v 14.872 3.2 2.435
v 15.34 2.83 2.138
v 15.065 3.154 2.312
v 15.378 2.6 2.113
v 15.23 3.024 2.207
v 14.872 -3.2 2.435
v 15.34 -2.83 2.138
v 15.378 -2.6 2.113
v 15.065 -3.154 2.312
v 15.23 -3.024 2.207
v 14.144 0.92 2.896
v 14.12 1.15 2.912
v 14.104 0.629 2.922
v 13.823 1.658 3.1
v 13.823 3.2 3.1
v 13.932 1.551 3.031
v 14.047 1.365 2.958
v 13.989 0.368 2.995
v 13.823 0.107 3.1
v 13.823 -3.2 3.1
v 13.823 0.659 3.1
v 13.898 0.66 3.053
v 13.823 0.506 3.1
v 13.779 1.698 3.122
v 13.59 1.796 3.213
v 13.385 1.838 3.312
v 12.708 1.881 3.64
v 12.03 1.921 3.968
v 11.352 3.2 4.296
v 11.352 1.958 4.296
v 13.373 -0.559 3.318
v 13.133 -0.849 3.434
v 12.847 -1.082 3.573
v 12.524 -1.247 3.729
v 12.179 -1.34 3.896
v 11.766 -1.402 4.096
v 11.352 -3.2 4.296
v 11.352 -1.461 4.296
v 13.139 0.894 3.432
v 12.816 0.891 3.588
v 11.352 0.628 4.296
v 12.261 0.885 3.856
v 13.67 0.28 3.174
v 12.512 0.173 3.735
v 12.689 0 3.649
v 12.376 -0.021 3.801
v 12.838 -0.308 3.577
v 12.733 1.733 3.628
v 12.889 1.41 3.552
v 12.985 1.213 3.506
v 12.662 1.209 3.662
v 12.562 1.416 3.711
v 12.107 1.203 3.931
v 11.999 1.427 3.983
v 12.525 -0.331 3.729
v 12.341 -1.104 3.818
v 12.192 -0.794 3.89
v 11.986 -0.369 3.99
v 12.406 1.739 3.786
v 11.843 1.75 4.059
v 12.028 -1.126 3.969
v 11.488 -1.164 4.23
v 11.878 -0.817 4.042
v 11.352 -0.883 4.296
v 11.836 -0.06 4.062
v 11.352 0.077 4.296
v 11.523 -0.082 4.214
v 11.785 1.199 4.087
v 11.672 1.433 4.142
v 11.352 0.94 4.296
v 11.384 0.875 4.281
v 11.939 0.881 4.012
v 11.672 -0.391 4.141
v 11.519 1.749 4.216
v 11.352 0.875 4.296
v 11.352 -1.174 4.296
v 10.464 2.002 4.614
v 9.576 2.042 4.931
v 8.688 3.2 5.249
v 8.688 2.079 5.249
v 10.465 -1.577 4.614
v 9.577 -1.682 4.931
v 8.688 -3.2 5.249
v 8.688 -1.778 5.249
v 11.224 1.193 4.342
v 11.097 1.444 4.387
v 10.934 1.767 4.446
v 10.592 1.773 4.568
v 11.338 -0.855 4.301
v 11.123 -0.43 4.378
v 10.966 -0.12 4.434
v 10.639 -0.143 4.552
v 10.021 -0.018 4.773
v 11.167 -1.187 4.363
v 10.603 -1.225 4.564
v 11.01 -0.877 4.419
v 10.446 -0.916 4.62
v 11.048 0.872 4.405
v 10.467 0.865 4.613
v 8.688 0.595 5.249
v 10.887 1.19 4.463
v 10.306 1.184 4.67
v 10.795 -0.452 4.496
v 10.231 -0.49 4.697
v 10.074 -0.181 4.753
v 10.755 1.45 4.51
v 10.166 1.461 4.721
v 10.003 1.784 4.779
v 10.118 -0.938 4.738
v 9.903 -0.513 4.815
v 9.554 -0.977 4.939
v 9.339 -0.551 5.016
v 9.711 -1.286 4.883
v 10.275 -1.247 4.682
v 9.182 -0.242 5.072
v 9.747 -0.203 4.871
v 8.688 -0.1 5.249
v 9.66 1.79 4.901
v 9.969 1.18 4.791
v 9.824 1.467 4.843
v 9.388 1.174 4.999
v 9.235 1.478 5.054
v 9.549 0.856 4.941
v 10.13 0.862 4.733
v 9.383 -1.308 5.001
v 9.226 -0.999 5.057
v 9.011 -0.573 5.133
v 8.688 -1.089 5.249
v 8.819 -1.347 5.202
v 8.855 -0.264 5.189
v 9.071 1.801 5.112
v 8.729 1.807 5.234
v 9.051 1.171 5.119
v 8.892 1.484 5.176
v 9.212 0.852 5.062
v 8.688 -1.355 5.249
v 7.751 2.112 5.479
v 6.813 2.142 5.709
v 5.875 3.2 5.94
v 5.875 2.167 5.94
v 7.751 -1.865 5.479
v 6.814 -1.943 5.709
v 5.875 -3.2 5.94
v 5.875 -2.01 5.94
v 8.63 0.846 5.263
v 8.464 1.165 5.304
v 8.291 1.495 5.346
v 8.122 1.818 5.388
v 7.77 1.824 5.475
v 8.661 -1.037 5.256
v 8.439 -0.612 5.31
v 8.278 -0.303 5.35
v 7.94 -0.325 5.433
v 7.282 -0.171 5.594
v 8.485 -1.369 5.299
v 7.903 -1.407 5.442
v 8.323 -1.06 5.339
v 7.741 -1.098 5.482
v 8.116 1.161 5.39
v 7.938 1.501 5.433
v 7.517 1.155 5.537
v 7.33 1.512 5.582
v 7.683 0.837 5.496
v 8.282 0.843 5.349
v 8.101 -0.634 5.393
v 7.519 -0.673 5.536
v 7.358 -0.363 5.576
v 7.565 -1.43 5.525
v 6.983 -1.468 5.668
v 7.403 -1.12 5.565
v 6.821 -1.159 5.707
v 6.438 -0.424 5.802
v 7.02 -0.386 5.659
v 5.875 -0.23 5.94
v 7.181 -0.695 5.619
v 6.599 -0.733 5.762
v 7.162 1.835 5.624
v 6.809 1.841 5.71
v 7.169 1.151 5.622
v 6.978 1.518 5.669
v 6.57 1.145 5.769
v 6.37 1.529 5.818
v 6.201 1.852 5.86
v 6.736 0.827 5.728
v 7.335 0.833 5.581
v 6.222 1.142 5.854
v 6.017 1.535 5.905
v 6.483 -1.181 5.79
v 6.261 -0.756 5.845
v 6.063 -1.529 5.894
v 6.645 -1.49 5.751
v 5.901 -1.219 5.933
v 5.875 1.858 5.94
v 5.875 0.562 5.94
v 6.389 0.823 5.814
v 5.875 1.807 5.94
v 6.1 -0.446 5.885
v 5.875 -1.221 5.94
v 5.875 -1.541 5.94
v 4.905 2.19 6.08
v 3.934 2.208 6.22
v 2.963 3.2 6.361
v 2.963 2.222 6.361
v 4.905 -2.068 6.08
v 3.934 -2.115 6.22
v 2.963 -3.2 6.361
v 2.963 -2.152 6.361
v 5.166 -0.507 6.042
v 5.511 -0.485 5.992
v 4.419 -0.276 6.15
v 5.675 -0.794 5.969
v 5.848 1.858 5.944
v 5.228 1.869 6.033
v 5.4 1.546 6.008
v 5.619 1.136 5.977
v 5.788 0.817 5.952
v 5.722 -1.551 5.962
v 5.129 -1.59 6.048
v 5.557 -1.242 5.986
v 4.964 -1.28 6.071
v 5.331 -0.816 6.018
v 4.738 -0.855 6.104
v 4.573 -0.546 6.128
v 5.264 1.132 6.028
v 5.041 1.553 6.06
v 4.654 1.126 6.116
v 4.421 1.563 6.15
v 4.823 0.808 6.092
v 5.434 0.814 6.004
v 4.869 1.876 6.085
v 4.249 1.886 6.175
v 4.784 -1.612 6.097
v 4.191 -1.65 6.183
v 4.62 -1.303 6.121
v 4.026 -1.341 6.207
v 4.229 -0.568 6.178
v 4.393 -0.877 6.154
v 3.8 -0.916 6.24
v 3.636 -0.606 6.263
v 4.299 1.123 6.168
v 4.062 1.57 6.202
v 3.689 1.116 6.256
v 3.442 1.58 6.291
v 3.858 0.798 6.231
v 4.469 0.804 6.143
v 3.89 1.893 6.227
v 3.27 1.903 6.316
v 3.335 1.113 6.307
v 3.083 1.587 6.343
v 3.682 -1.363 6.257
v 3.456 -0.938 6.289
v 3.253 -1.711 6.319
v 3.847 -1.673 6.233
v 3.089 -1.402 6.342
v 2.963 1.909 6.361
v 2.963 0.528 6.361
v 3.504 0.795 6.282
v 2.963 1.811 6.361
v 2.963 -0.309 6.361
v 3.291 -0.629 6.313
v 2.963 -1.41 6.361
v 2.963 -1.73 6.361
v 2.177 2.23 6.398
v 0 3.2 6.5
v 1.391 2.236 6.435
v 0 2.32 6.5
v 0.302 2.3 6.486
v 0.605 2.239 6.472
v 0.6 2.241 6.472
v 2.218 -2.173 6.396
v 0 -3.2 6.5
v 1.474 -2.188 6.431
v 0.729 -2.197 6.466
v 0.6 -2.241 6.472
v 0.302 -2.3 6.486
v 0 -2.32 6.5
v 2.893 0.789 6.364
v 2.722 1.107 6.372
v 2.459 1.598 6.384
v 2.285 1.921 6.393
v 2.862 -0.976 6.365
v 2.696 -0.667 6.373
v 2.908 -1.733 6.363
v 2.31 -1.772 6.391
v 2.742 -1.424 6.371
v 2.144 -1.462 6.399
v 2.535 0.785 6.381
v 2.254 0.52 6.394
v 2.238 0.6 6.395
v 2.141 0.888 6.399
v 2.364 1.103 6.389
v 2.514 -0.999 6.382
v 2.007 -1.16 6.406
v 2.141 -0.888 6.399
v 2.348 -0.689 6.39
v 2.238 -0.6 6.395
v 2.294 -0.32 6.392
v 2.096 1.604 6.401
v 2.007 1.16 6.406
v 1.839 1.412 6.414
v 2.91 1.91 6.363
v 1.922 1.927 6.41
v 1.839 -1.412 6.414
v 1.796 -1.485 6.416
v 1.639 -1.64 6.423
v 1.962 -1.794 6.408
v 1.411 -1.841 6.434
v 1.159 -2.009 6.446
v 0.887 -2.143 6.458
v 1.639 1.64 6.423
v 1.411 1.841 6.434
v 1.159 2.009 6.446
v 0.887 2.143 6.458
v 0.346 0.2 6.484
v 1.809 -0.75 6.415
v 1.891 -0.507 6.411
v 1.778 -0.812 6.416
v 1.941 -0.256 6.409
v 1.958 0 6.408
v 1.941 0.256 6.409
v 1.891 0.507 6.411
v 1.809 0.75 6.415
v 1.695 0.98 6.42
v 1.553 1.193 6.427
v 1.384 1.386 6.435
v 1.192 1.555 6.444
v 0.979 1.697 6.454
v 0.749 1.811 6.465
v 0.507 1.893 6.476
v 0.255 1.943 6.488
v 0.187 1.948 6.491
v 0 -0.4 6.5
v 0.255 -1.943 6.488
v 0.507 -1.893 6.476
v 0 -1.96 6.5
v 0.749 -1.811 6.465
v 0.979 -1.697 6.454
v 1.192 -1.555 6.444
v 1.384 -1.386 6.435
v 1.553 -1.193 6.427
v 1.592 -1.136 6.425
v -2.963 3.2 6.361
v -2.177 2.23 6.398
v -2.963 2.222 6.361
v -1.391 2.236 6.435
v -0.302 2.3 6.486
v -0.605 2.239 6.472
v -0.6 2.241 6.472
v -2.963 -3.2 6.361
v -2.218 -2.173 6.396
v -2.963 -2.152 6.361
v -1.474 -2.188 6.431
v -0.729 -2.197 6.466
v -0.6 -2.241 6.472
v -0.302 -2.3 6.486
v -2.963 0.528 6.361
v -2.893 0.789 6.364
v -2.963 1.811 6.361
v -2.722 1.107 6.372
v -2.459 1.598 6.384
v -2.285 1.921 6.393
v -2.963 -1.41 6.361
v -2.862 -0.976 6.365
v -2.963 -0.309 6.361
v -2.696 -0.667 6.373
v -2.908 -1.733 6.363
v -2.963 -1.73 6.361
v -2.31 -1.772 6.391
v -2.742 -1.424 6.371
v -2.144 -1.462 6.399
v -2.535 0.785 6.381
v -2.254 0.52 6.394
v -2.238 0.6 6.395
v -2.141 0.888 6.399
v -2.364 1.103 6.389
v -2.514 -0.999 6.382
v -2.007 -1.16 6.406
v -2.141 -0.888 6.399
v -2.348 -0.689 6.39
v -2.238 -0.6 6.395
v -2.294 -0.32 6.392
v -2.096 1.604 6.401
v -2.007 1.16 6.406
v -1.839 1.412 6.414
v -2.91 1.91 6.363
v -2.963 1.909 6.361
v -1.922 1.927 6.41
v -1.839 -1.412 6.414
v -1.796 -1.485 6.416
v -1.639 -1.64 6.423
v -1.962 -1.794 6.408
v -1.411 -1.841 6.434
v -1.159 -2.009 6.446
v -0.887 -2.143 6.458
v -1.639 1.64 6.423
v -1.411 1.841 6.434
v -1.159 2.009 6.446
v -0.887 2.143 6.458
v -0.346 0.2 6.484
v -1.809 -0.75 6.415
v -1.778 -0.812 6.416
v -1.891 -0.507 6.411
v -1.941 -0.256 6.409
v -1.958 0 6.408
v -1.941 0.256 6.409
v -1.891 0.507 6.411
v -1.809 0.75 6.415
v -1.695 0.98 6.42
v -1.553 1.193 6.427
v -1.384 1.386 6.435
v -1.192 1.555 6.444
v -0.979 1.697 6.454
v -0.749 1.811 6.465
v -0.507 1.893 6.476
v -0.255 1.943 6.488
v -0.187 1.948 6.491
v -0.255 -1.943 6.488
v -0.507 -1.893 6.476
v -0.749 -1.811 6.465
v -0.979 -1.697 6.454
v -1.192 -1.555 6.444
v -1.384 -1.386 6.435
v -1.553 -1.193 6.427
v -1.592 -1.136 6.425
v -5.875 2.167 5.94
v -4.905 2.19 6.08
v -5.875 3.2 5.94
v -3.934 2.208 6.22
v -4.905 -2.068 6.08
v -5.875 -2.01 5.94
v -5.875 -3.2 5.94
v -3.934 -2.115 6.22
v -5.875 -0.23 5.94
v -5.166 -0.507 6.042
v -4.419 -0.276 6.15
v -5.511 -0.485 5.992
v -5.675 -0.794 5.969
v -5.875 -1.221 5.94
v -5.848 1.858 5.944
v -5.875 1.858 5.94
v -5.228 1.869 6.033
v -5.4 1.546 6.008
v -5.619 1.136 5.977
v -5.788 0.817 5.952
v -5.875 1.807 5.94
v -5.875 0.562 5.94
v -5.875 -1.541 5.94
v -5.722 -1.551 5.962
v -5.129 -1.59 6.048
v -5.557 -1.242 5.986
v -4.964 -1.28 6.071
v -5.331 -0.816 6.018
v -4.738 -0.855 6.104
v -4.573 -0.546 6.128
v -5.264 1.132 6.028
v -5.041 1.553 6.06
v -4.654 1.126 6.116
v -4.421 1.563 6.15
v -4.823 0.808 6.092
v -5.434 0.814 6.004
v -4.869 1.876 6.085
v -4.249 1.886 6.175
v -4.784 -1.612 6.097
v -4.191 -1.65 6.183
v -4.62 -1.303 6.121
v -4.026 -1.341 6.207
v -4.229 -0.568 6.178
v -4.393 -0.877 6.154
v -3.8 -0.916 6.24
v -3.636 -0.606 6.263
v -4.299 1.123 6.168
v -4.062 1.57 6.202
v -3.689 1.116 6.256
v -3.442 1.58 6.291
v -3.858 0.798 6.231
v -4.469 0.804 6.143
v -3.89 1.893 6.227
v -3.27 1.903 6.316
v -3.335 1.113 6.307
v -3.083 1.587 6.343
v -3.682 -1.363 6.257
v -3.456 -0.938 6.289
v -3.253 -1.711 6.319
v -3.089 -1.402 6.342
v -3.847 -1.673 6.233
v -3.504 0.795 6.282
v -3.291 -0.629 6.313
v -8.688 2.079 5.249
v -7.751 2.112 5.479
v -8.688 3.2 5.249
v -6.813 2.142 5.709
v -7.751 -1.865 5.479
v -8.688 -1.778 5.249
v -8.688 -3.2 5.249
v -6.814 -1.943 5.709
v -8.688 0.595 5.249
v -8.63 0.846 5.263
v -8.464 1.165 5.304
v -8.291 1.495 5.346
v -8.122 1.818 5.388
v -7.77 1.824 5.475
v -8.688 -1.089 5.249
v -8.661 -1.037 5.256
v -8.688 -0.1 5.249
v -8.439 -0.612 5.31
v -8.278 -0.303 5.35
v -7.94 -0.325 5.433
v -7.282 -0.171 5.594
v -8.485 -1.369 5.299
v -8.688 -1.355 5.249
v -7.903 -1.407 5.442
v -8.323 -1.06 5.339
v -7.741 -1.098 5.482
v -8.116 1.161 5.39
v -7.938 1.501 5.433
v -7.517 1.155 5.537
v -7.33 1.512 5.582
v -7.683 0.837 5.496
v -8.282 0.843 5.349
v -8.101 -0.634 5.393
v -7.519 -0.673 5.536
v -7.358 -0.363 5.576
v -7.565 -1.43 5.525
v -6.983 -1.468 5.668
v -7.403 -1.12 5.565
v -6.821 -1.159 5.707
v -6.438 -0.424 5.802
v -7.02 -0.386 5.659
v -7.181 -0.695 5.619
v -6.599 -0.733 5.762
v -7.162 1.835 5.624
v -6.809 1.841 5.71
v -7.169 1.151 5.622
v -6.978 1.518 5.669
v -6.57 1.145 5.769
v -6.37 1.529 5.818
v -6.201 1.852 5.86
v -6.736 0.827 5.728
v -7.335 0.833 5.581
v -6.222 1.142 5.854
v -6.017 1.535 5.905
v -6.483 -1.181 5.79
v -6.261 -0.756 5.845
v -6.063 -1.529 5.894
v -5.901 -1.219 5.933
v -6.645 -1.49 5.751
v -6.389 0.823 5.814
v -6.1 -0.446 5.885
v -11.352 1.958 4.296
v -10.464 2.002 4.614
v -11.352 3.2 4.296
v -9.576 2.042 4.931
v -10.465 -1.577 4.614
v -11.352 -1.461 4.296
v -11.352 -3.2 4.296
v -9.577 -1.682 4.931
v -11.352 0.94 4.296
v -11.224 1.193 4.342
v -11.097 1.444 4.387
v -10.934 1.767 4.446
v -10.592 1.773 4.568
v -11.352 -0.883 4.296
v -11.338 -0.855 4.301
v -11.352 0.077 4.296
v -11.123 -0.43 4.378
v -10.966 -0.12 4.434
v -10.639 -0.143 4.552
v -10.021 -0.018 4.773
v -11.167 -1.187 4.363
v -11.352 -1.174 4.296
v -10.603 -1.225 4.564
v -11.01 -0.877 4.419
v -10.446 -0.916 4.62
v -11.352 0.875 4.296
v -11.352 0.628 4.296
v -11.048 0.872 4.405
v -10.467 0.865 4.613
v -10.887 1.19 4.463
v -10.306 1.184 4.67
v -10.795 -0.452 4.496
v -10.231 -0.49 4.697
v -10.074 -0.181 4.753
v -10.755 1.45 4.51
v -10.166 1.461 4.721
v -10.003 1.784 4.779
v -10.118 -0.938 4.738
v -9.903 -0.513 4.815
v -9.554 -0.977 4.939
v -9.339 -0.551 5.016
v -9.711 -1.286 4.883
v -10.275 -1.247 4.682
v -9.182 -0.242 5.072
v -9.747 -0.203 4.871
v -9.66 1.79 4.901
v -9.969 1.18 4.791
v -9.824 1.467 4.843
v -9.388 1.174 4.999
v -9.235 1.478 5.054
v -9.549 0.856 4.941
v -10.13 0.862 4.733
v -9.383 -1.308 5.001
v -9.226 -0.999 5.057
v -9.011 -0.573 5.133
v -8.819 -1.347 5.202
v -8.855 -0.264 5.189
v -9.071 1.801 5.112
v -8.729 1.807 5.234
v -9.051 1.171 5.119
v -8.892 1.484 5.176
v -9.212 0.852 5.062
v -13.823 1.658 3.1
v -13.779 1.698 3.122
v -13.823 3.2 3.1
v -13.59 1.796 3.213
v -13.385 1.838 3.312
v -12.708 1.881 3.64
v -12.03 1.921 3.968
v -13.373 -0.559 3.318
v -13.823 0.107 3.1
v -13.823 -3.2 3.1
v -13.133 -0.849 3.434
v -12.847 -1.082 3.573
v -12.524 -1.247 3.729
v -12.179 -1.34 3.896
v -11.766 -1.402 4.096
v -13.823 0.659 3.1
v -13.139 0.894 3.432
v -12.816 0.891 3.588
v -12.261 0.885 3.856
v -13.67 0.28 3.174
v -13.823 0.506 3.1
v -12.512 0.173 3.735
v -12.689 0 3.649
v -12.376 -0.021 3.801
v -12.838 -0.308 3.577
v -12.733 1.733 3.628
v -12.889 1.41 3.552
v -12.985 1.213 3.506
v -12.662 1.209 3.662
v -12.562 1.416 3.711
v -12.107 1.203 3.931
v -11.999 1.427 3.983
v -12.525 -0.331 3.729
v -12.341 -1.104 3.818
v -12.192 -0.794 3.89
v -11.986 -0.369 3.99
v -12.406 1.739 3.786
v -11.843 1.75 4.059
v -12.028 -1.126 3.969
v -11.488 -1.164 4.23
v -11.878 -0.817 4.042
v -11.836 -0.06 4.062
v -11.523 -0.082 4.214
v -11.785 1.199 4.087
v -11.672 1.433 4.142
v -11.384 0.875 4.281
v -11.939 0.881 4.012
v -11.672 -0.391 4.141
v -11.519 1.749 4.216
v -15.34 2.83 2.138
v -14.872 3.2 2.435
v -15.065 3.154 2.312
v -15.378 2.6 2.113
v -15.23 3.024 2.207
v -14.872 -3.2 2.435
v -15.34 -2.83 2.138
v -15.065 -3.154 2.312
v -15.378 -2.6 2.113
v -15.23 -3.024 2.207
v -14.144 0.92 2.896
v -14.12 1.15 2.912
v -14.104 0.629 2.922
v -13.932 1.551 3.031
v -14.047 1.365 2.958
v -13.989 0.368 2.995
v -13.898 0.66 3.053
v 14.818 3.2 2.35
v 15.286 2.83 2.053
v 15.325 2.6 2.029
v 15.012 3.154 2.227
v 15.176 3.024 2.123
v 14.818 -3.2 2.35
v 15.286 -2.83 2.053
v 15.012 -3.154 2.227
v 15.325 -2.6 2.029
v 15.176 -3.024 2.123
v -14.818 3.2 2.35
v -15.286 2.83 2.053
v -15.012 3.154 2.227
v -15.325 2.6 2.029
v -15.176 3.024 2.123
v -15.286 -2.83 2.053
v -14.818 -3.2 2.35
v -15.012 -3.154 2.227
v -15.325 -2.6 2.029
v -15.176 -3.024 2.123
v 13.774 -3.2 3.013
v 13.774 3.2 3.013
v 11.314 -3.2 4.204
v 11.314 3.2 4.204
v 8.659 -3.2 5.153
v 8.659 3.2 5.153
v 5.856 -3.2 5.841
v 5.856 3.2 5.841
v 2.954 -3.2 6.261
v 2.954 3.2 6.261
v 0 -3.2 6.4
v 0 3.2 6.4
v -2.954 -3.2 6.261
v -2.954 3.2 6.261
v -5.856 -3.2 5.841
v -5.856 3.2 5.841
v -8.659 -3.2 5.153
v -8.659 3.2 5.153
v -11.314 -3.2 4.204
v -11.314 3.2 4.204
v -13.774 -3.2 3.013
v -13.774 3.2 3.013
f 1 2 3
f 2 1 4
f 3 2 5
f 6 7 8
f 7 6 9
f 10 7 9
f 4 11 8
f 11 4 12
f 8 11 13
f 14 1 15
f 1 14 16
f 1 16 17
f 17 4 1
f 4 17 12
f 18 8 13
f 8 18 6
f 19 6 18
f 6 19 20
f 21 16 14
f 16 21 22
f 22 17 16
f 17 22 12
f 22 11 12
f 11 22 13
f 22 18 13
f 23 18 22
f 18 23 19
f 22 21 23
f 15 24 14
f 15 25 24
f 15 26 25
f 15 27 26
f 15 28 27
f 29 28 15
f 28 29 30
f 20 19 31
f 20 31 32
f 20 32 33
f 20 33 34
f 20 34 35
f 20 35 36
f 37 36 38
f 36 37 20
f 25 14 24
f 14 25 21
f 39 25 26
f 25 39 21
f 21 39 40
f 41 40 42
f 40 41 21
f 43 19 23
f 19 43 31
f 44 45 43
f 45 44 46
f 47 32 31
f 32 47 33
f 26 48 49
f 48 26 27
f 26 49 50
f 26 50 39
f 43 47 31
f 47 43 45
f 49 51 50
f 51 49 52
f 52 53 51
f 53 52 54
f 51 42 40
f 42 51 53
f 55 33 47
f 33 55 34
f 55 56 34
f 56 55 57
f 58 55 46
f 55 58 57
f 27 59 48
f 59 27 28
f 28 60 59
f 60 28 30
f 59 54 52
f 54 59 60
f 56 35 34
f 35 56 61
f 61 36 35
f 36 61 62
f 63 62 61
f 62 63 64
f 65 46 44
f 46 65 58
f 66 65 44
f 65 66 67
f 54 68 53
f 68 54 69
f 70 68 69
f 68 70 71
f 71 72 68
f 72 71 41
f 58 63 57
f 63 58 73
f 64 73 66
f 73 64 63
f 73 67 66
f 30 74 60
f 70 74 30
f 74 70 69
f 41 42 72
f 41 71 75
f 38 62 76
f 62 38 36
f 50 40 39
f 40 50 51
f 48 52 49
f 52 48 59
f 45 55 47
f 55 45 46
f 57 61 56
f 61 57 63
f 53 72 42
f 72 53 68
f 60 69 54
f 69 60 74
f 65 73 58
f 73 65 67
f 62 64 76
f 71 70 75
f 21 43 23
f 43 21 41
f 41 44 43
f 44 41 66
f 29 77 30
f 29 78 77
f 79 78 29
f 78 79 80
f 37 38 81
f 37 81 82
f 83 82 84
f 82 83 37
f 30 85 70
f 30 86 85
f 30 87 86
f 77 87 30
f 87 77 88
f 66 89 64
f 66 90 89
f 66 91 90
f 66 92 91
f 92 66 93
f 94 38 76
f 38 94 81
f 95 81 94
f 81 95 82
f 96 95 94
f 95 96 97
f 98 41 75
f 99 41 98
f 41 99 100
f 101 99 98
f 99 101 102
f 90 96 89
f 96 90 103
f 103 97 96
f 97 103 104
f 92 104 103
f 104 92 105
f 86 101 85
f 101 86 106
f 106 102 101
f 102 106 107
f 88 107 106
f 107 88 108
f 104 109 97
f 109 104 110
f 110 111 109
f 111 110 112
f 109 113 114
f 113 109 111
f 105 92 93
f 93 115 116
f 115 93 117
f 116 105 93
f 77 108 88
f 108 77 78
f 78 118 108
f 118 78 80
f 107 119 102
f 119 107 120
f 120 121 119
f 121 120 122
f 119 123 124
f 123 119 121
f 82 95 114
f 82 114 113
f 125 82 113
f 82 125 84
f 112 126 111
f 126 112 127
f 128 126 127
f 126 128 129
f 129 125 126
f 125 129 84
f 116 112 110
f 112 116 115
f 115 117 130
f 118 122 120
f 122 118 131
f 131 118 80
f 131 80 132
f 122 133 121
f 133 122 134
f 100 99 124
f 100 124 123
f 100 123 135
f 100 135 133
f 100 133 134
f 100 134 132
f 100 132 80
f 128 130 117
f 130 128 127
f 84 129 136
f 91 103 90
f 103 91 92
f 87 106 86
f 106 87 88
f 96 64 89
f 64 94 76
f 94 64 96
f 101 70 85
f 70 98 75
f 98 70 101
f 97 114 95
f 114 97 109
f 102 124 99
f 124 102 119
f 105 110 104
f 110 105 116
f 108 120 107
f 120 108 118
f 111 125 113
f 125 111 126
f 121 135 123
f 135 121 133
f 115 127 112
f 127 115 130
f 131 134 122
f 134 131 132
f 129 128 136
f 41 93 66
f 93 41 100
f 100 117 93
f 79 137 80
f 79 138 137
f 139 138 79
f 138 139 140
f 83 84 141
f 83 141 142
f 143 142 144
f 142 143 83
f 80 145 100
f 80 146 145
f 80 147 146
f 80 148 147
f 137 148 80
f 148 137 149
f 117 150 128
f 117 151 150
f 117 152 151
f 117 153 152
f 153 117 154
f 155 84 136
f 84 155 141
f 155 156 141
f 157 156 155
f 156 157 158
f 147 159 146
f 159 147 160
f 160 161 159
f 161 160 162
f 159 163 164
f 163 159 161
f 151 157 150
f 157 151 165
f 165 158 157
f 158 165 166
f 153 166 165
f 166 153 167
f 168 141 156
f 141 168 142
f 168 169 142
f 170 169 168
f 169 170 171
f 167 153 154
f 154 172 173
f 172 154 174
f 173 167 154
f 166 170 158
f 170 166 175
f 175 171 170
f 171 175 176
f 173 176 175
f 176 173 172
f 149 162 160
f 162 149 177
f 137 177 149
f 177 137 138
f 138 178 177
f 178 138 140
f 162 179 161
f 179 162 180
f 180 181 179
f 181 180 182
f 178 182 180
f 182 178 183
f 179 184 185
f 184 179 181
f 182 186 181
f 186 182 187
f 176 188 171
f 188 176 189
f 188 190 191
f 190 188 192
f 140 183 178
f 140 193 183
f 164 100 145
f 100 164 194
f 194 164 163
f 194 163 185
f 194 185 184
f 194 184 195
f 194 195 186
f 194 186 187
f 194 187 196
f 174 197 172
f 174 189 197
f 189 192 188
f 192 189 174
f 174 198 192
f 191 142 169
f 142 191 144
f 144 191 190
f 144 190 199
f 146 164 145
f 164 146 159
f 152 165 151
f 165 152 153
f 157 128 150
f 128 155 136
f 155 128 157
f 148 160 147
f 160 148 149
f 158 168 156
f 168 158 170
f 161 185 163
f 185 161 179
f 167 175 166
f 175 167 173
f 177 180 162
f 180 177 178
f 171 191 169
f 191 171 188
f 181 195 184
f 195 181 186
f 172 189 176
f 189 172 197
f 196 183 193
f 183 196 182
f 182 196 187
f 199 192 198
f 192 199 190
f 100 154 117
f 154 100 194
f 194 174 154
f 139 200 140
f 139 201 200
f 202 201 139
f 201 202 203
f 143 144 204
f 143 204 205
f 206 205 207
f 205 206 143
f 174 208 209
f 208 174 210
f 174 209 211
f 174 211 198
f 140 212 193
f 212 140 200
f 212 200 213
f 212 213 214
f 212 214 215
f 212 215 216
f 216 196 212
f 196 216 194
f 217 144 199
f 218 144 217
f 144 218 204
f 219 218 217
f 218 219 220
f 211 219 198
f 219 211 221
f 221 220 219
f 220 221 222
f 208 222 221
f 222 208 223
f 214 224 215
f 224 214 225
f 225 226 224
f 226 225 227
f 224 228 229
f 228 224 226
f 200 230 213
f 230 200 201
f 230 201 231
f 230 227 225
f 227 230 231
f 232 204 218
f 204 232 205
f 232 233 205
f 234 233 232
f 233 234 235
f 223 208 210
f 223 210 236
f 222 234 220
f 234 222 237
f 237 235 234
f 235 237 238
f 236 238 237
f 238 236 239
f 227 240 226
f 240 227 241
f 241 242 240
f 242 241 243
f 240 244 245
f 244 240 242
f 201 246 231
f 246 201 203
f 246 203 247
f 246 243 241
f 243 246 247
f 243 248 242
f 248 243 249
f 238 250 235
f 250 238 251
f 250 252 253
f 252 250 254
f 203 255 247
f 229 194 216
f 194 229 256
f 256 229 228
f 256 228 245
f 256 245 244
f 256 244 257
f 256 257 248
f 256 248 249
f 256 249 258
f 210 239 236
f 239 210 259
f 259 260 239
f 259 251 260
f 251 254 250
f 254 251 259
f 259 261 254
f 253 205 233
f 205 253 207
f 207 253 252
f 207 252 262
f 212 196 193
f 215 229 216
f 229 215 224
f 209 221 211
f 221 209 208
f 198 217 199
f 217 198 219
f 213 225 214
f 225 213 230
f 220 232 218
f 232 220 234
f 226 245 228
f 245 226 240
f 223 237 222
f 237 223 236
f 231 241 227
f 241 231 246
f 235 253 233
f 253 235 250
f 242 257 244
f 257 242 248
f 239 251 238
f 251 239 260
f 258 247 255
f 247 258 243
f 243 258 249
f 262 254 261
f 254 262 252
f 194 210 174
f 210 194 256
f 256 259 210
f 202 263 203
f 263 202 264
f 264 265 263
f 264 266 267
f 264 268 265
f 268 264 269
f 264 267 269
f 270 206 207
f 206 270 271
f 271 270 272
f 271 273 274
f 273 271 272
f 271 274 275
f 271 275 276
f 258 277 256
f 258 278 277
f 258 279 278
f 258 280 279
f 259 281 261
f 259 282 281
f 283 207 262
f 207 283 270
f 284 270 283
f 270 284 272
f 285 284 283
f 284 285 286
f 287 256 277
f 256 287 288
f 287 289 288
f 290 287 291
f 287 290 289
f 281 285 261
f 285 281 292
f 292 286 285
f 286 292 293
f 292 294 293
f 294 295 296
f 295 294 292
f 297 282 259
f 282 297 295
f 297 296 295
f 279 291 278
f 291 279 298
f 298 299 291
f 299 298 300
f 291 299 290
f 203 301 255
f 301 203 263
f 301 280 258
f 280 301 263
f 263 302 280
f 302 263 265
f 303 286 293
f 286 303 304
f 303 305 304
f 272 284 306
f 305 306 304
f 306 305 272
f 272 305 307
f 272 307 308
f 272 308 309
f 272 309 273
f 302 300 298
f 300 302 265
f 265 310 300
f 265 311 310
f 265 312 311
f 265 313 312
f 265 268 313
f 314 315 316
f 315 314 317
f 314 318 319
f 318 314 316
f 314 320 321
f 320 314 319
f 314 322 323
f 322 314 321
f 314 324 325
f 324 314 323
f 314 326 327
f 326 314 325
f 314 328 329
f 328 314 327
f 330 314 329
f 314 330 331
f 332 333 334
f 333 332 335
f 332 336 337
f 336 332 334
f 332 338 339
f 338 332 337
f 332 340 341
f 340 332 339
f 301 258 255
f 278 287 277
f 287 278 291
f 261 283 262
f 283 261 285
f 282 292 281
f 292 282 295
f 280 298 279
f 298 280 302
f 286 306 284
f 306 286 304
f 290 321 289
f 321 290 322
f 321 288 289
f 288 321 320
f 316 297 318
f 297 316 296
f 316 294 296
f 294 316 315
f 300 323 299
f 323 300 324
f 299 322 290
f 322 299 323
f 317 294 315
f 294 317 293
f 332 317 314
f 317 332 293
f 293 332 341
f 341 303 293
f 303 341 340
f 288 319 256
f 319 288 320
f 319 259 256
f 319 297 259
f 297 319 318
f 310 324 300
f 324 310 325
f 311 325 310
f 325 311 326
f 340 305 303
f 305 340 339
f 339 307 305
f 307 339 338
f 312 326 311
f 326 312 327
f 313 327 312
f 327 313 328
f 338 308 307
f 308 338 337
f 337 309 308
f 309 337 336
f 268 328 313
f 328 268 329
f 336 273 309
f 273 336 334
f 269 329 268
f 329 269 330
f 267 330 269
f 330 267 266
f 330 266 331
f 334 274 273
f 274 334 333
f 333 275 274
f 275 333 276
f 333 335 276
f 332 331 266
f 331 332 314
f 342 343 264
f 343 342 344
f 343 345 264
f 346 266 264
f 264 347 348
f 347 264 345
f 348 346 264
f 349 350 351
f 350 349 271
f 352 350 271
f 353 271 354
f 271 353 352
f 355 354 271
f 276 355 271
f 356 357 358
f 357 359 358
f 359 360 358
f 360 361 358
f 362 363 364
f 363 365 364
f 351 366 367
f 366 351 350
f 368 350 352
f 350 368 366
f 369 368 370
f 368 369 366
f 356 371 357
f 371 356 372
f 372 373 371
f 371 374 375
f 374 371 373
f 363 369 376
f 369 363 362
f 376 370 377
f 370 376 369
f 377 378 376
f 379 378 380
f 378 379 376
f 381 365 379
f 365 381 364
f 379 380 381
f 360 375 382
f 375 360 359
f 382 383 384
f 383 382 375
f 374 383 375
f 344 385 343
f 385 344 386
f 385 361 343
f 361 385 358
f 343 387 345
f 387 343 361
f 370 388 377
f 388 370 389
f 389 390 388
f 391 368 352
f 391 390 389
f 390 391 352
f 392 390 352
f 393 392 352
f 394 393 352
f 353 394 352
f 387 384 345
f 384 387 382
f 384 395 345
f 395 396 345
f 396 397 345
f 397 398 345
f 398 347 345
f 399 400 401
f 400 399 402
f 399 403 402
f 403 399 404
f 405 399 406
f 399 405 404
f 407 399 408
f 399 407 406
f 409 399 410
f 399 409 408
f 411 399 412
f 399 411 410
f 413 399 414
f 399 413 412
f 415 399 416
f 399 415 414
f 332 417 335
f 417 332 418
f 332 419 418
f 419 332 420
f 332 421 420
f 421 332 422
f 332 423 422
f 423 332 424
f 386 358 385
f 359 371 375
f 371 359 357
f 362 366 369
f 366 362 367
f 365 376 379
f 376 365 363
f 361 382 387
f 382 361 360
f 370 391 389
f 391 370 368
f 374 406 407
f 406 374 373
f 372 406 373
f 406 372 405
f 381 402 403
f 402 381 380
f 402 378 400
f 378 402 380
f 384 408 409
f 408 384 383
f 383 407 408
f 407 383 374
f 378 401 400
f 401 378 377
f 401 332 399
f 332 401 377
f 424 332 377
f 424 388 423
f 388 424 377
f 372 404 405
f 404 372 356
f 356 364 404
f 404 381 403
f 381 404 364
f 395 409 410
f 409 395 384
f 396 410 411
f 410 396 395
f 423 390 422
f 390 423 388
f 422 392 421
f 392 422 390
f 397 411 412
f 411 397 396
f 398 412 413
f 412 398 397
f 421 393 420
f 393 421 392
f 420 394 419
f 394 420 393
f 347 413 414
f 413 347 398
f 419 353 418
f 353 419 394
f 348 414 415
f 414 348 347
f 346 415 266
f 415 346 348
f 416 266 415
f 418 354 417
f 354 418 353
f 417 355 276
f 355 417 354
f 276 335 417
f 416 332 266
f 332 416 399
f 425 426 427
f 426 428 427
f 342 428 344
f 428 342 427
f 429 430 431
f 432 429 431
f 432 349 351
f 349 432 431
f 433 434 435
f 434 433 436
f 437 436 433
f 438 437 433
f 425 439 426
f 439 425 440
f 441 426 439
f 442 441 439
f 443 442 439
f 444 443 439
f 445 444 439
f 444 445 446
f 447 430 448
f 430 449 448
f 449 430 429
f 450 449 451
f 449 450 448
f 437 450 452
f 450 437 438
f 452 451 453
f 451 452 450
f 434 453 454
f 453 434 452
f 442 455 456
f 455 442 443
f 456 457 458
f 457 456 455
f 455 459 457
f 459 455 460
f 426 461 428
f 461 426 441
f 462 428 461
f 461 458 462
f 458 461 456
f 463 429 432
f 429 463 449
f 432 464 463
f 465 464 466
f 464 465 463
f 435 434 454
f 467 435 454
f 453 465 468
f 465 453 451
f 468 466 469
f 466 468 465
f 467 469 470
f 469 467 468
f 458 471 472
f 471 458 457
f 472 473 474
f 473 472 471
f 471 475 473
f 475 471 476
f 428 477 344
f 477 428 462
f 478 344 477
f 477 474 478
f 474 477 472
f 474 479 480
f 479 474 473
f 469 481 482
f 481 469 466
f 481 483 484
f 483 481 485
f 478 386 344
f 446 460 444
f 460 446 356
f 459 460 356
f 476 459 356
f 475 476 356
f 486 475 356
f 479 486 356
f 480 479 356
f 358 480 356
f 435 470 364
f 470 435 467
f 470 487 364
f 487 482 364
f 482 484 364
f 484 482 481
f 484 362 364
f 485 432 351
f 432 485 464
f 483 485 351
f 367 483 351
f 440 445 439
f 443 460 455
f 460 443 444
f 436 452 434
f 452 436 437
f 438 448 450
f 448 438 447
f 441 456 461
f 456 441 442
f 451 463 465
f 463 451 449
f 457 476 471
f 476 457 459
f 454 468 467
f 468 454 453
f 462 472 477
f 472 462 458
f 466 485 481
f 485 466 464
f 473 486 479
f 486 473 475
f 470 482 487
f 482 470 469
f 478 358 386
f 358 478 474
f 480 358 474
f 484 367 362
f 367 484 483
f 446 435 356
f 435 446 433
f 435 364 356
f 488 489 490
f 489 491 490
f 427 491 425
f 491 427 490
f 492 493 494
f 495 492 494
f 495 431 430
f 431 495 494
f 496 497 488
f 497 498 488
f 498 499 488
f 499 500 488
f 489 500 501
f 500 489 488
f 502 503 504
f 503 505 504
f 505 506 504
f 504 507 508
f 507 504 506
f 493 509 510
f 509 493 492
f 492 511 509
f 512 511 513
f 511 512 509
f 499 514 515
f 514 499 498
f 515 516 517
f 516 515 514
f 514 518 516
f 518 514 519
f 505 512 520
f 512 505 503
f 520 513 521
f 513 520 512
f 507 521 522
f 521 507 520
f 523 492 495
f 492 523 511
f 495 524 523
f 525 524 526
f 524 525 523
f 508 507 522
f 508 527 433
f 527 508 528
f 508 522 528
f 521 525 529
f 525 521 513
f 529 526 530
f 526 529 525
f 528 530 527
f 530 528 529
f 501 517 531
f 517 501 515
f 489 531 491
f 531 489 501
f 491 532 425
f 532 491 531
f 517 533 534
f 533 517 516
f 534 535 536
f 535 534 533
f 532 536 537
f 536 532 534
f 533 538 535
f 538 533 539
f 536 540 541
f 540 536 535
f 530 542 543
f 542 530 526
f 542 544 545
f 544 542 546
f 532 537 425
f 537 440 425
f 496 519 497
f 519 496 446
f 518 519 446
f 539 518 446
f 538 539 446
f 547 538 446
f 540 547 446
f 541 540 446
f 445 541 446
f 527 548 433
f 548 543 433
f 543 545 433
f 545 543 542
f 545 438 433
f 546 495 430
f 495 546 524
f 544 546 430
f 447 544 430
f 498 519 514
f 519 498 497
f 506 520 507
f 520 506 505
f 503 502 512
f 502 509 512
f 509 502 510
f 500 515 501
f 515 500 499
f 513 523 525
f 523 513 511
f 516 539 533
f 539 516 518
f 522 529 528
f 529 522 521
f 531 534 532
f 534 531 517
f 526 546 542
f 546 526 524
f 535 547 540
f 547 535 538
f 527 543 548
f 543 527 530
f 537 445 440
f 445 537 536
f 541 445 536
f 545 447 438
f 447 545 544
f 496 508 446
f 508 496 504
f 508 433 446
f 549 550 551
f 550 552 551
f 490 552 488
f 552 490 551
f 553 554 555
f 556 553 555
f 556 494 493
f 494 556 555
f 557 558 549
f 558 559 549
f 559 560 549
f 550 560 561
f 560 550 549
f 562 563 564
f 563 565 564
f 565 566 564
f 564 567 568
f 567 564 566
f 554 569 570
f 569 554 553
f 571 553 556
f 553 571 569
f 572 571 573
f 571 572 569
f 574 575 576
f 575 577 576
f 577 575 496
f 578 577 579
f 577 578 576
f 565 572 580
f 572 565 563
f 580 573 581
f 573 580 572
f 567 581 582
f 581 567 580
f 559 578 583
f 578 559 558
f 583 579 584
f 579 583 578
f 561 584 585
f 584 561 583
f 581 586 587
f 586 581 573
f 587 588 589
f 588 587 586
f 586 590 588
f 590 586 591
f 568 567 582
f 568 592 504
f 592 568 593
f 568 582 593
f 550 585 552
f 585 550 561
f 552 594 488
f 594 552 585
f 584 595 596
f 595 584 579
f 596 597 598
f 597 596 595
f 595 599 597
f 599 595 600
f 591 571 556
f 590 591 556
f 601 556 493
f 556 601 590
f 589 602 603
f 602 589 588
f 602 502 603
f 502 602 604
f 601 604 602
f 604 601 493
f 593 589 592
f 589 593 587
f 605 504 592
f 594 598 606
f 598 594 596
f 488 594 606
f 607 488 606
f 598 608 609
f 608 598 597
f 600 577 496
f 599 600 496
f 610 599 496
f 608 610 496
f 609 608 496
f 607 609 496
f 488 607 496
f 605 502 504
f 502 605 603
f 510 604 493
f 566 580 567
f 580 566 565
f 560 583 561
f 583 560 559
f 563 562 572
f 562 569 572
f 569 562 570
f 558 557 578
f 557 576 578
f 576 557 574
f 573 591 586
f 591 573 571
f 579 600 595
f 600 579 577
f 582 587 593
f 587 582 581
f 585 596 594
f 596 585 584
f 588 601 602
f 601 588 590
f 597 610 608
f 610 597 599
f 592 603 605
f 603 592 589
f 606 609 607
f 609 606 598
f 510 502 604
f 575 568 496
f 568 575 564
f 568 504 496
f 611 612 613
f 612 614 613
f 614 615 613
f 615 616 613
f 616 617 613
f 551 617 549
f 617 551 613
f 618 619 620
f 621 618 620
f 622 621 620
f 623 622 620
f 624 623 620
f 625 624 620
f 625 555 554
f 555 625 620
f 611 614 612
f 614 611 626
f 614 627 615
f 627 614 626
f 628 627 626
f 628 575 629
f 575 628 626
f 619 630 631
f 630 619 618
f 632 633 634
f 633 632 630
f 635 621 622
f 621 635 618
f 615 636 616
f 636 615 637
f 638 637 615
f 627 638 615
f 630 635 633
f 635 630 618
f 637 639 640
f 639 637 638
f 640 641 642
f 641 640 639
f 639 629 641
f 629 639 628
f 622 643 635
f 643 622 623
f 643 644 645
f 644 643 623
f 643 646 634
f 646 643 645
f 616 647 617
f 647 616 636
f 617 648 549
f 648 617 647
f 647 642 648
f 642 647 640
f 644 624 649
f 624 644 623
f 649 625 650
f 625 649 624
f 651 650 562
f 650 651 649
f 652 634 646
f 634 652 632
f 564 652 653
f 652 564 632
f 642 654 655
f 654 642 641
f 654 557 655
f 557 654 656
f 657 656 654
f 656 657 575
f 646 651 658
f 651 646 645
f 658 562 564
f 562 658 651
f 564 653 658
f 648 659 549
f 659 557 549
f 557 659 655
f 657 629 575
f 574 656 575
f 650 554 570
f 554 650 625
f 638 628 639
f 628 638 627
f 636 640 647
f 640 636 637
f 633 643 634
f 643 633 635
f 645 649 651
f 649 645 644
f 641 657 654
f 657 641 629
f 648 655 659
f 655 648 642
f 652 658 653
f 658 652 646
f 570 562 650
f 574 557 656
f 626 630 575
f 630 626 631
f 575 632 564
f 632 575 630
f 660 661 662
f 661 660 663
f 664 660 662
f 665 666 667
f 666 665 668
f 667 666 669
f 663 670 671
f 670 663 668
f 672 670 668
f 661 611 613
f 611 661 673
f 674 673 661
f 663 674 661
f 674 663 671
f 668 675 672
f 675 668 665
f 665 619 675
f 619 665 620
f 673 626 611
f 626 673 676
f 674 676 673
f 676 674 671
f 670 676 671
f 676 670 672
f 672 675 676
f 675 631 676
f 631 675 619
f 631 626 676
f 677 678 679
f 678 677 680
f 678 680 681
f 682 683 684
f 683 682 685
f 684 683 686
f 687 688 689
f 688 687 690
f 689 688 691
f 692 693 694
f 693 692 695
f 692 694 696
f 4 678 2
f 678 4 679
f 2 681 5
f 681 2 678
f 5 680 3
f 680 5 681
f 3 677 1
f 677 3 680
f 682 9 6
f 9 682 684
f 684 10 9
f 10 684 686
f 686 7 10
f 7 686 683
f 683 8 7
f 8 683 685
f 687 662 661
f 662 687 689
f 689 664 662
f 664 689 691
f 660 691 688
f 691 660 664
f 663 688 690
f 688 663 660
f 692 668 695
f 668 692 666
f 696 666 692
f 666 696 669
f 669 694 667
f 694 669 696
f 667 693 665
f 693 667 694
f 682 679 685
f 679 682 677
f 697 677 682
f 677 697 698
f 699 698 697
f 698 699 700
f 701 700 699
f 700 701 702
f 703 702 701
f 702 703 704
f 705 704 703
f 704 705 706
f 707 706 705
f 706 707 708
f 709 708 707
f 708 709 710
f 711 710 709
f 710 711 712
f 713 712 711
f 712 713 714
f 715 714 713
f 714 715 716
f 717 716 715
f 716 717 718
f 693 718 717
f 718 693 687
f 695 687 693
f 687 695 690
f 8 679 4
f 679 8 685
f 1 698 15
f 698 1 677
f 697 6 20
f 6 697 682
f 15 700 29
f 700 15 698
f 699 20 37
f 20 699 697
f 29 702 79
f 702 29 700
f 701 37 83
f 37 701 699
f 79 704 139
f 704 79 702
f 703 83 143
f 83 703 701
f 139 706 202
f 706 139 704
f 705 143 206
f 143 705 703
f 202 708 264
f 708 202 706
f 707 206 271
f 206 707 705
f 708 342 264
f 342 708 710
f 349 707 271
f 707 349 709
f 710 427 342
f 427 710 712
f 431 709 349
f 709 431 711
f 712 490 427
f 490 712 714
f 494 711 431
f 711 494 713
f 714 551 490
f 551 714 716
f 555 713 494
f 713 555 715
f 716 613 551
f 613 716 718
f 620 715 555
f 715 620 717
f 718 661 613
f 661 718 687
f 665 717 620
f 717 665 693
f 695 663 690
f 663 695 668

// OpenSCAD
use <../lib.scad>
use <s/6177741es11.scad>
use <s/6177741vs01.scad>
use <s/6177741vs02.scad>
use <s/6177741vs03.scad>
use <s/6177741vs04.scad>
use <s/6177741vs05.scad>
use <s/6177741vs06.scad>
function ldraw_lib__6177741vc01() = [
// 0 Sticker  0.8 x  4.1 with Front Grille with Horizontal Line and Dots on Transparent Background (Formed)
// 0 Name: 6177741vc01.dat
// 0 Author: Massimo Maso [Sirio]
// 0 !LDRAW_ORG Part UPDATE 2025-05
// 0 !LICENSE Licensed under CC BY 4.0 : see CAreadme.txt
// 
// 0 BFC CERTIFY CCW
  [0,"BFC","CERTIFY"],
  [0,"BFC","CCW"],
// 
// 0 !KEYWORDS AMG, GT3, Mercedes, Set 75877, Speed Champions
// 
// 0 !HISTORY 2025-05-28 [OrionP] Official Update 2025-05
// 
// 
// 1 16 34.436 -7.5317 0 0 -.5359 .844281 0 .844281 .5359 -1 0 0 s\6177741vs01.dat
  [1,16,34.436,-7.5317,0,0,-.5359,.844281,0,.844281,.5359,-1,0,0, ldraw_lib__s__6177741vs01()],
// 1 16 34.436 -7.5317 0 0 -.435742 .900072 0 .900072 .435742 -1 0 0 s\6177741vs02.dat
  [1,16,34.436,-7.5317,0,0,-.435742,.900072,0,.900072,.435742,-1,0,0, ldraw_lib__s__6177741vs02()],
// 1 16 21.648 -12.8828 0 0 -.336689 .941616 0 .941616 .336689 -1 0 0 s\6177741vs03.dat
  [1,16,21.648,-12.8828,0,0,-.336689,.941616,0,.941616,.336689,-1,0,0, ldraw_lib__s__6177741vs03()],
// 1 16 21.648 -12.8828 0 0 -.238478 .971148 0 .971148 .238478 -1 0 0 s\6177741vs04.dat
  [1,16,21.648,-12.8828,0,0,-.238478,.971148,0,.971148,.238478,-1,0,0, ldraw_lib__s__6177741vs04()],
// 1 16 7.384 -15.6525 0 0 -.143056 .989715 0 .989715 .143056 -1 0 0 s\6177741vs05.dat
  [1,16,7.384,-15.6525,0,0,-.143056,.989715,0,.989715,.143056,-1,0,0, ldraw_lib__s__6177741vs05()],
// 1 16 7.384 -15.6525 0 0 -.047009 .998894 0 .998894 .047009 -1 0 0 s\6177741vs06.dat
  [1,16,7.384,-15.6525,0,0,-.047009,.998894,0,.998894,.047009,-1,0,0, ldraw_lib__s__6177741vs06()],
// 1 16 -7.384 -15.6525 0 0 .047009 -.998894 0 .998894 .047009 -1 0 0 s\6177741vs06.dat
  [1,16,-7.384,-15.6525,0,0,.047009,-.998894,0,.998894,.047009,-1,0,0, ldraw_lib__s__6177741vs06()],
// 1 16 -7.384 -15.6525 0 0 .143056 -.989715 0 .989715 .143056 -1 0 0 s\6177741vs05.dat
  [1,16,-7.384,-15.6525,0,0,.143056,-.989715,0,.989715,.143056,-1,0,0, ldraw_lib__s__6177741vs05()],
// 1 16 -21.648 -12.8828 0 0 .238478 -.971148 0 .971148 .238478 -1 0 0 s\6177741vs04.dat
  [1,16,-21.648,-12.8828,0,0,.238478,-.971148,0,.971148,.238478,-1,0,0, ldraw_lib__s__6177741vs04()],
// 1 16 -21.648 -12.8828 0 0 .336689 -.941616 0 .941616 .336689 -1 0 0 s\6177741vs03.dat
  [1,16,-21.648,-12.8828,0,0,.336689,-.941616,0,.941616,.336689,-1,0,0, ldraw_lib__s__6177741vs03()],
// 1 16 -34.436 -7.5317 0 0 .435742 -.900072 0 .900072 .435742 -1 0 0 s\6177741vs02.dat
  [1,16,-34.436,-7.5317,0,0,.435742,-.900072,0,.900072,.435742,-1,0,0, ldraw_lib__s__6177741vs02()],
// 1 16 -34.436 -7.5317 0 0 .5359 -.844281 0 .844281 .5359 -1 0 0 s\6177741vs01.dat
  [1,16,-34.436,-7.5317,0,0,.5359,-.844281,0,.844281,.5359,-1,0,0, ldraw_lib__s__6177741vs01()],
// 1 16 0 0 0 0 0 1 0 1 0 -1 0 0 s\6177741es11.dat
  [1,16,0,0,0,0,0,1,0,1,0,-1,0,0, ldraw_lib__s__6177741es11()],
];
module ldraw_lib__6177741vc01(step=0, col=false, unit=2/5, alt=false, line=0.2, solid=!$preview)
    makepoly(ldraw_lib__6177741vc01(), step=step, col=col, unit=unit, alt=alt, line=line, solid=solid);
ldraw_lib__6177741vc01(line=0.2);
